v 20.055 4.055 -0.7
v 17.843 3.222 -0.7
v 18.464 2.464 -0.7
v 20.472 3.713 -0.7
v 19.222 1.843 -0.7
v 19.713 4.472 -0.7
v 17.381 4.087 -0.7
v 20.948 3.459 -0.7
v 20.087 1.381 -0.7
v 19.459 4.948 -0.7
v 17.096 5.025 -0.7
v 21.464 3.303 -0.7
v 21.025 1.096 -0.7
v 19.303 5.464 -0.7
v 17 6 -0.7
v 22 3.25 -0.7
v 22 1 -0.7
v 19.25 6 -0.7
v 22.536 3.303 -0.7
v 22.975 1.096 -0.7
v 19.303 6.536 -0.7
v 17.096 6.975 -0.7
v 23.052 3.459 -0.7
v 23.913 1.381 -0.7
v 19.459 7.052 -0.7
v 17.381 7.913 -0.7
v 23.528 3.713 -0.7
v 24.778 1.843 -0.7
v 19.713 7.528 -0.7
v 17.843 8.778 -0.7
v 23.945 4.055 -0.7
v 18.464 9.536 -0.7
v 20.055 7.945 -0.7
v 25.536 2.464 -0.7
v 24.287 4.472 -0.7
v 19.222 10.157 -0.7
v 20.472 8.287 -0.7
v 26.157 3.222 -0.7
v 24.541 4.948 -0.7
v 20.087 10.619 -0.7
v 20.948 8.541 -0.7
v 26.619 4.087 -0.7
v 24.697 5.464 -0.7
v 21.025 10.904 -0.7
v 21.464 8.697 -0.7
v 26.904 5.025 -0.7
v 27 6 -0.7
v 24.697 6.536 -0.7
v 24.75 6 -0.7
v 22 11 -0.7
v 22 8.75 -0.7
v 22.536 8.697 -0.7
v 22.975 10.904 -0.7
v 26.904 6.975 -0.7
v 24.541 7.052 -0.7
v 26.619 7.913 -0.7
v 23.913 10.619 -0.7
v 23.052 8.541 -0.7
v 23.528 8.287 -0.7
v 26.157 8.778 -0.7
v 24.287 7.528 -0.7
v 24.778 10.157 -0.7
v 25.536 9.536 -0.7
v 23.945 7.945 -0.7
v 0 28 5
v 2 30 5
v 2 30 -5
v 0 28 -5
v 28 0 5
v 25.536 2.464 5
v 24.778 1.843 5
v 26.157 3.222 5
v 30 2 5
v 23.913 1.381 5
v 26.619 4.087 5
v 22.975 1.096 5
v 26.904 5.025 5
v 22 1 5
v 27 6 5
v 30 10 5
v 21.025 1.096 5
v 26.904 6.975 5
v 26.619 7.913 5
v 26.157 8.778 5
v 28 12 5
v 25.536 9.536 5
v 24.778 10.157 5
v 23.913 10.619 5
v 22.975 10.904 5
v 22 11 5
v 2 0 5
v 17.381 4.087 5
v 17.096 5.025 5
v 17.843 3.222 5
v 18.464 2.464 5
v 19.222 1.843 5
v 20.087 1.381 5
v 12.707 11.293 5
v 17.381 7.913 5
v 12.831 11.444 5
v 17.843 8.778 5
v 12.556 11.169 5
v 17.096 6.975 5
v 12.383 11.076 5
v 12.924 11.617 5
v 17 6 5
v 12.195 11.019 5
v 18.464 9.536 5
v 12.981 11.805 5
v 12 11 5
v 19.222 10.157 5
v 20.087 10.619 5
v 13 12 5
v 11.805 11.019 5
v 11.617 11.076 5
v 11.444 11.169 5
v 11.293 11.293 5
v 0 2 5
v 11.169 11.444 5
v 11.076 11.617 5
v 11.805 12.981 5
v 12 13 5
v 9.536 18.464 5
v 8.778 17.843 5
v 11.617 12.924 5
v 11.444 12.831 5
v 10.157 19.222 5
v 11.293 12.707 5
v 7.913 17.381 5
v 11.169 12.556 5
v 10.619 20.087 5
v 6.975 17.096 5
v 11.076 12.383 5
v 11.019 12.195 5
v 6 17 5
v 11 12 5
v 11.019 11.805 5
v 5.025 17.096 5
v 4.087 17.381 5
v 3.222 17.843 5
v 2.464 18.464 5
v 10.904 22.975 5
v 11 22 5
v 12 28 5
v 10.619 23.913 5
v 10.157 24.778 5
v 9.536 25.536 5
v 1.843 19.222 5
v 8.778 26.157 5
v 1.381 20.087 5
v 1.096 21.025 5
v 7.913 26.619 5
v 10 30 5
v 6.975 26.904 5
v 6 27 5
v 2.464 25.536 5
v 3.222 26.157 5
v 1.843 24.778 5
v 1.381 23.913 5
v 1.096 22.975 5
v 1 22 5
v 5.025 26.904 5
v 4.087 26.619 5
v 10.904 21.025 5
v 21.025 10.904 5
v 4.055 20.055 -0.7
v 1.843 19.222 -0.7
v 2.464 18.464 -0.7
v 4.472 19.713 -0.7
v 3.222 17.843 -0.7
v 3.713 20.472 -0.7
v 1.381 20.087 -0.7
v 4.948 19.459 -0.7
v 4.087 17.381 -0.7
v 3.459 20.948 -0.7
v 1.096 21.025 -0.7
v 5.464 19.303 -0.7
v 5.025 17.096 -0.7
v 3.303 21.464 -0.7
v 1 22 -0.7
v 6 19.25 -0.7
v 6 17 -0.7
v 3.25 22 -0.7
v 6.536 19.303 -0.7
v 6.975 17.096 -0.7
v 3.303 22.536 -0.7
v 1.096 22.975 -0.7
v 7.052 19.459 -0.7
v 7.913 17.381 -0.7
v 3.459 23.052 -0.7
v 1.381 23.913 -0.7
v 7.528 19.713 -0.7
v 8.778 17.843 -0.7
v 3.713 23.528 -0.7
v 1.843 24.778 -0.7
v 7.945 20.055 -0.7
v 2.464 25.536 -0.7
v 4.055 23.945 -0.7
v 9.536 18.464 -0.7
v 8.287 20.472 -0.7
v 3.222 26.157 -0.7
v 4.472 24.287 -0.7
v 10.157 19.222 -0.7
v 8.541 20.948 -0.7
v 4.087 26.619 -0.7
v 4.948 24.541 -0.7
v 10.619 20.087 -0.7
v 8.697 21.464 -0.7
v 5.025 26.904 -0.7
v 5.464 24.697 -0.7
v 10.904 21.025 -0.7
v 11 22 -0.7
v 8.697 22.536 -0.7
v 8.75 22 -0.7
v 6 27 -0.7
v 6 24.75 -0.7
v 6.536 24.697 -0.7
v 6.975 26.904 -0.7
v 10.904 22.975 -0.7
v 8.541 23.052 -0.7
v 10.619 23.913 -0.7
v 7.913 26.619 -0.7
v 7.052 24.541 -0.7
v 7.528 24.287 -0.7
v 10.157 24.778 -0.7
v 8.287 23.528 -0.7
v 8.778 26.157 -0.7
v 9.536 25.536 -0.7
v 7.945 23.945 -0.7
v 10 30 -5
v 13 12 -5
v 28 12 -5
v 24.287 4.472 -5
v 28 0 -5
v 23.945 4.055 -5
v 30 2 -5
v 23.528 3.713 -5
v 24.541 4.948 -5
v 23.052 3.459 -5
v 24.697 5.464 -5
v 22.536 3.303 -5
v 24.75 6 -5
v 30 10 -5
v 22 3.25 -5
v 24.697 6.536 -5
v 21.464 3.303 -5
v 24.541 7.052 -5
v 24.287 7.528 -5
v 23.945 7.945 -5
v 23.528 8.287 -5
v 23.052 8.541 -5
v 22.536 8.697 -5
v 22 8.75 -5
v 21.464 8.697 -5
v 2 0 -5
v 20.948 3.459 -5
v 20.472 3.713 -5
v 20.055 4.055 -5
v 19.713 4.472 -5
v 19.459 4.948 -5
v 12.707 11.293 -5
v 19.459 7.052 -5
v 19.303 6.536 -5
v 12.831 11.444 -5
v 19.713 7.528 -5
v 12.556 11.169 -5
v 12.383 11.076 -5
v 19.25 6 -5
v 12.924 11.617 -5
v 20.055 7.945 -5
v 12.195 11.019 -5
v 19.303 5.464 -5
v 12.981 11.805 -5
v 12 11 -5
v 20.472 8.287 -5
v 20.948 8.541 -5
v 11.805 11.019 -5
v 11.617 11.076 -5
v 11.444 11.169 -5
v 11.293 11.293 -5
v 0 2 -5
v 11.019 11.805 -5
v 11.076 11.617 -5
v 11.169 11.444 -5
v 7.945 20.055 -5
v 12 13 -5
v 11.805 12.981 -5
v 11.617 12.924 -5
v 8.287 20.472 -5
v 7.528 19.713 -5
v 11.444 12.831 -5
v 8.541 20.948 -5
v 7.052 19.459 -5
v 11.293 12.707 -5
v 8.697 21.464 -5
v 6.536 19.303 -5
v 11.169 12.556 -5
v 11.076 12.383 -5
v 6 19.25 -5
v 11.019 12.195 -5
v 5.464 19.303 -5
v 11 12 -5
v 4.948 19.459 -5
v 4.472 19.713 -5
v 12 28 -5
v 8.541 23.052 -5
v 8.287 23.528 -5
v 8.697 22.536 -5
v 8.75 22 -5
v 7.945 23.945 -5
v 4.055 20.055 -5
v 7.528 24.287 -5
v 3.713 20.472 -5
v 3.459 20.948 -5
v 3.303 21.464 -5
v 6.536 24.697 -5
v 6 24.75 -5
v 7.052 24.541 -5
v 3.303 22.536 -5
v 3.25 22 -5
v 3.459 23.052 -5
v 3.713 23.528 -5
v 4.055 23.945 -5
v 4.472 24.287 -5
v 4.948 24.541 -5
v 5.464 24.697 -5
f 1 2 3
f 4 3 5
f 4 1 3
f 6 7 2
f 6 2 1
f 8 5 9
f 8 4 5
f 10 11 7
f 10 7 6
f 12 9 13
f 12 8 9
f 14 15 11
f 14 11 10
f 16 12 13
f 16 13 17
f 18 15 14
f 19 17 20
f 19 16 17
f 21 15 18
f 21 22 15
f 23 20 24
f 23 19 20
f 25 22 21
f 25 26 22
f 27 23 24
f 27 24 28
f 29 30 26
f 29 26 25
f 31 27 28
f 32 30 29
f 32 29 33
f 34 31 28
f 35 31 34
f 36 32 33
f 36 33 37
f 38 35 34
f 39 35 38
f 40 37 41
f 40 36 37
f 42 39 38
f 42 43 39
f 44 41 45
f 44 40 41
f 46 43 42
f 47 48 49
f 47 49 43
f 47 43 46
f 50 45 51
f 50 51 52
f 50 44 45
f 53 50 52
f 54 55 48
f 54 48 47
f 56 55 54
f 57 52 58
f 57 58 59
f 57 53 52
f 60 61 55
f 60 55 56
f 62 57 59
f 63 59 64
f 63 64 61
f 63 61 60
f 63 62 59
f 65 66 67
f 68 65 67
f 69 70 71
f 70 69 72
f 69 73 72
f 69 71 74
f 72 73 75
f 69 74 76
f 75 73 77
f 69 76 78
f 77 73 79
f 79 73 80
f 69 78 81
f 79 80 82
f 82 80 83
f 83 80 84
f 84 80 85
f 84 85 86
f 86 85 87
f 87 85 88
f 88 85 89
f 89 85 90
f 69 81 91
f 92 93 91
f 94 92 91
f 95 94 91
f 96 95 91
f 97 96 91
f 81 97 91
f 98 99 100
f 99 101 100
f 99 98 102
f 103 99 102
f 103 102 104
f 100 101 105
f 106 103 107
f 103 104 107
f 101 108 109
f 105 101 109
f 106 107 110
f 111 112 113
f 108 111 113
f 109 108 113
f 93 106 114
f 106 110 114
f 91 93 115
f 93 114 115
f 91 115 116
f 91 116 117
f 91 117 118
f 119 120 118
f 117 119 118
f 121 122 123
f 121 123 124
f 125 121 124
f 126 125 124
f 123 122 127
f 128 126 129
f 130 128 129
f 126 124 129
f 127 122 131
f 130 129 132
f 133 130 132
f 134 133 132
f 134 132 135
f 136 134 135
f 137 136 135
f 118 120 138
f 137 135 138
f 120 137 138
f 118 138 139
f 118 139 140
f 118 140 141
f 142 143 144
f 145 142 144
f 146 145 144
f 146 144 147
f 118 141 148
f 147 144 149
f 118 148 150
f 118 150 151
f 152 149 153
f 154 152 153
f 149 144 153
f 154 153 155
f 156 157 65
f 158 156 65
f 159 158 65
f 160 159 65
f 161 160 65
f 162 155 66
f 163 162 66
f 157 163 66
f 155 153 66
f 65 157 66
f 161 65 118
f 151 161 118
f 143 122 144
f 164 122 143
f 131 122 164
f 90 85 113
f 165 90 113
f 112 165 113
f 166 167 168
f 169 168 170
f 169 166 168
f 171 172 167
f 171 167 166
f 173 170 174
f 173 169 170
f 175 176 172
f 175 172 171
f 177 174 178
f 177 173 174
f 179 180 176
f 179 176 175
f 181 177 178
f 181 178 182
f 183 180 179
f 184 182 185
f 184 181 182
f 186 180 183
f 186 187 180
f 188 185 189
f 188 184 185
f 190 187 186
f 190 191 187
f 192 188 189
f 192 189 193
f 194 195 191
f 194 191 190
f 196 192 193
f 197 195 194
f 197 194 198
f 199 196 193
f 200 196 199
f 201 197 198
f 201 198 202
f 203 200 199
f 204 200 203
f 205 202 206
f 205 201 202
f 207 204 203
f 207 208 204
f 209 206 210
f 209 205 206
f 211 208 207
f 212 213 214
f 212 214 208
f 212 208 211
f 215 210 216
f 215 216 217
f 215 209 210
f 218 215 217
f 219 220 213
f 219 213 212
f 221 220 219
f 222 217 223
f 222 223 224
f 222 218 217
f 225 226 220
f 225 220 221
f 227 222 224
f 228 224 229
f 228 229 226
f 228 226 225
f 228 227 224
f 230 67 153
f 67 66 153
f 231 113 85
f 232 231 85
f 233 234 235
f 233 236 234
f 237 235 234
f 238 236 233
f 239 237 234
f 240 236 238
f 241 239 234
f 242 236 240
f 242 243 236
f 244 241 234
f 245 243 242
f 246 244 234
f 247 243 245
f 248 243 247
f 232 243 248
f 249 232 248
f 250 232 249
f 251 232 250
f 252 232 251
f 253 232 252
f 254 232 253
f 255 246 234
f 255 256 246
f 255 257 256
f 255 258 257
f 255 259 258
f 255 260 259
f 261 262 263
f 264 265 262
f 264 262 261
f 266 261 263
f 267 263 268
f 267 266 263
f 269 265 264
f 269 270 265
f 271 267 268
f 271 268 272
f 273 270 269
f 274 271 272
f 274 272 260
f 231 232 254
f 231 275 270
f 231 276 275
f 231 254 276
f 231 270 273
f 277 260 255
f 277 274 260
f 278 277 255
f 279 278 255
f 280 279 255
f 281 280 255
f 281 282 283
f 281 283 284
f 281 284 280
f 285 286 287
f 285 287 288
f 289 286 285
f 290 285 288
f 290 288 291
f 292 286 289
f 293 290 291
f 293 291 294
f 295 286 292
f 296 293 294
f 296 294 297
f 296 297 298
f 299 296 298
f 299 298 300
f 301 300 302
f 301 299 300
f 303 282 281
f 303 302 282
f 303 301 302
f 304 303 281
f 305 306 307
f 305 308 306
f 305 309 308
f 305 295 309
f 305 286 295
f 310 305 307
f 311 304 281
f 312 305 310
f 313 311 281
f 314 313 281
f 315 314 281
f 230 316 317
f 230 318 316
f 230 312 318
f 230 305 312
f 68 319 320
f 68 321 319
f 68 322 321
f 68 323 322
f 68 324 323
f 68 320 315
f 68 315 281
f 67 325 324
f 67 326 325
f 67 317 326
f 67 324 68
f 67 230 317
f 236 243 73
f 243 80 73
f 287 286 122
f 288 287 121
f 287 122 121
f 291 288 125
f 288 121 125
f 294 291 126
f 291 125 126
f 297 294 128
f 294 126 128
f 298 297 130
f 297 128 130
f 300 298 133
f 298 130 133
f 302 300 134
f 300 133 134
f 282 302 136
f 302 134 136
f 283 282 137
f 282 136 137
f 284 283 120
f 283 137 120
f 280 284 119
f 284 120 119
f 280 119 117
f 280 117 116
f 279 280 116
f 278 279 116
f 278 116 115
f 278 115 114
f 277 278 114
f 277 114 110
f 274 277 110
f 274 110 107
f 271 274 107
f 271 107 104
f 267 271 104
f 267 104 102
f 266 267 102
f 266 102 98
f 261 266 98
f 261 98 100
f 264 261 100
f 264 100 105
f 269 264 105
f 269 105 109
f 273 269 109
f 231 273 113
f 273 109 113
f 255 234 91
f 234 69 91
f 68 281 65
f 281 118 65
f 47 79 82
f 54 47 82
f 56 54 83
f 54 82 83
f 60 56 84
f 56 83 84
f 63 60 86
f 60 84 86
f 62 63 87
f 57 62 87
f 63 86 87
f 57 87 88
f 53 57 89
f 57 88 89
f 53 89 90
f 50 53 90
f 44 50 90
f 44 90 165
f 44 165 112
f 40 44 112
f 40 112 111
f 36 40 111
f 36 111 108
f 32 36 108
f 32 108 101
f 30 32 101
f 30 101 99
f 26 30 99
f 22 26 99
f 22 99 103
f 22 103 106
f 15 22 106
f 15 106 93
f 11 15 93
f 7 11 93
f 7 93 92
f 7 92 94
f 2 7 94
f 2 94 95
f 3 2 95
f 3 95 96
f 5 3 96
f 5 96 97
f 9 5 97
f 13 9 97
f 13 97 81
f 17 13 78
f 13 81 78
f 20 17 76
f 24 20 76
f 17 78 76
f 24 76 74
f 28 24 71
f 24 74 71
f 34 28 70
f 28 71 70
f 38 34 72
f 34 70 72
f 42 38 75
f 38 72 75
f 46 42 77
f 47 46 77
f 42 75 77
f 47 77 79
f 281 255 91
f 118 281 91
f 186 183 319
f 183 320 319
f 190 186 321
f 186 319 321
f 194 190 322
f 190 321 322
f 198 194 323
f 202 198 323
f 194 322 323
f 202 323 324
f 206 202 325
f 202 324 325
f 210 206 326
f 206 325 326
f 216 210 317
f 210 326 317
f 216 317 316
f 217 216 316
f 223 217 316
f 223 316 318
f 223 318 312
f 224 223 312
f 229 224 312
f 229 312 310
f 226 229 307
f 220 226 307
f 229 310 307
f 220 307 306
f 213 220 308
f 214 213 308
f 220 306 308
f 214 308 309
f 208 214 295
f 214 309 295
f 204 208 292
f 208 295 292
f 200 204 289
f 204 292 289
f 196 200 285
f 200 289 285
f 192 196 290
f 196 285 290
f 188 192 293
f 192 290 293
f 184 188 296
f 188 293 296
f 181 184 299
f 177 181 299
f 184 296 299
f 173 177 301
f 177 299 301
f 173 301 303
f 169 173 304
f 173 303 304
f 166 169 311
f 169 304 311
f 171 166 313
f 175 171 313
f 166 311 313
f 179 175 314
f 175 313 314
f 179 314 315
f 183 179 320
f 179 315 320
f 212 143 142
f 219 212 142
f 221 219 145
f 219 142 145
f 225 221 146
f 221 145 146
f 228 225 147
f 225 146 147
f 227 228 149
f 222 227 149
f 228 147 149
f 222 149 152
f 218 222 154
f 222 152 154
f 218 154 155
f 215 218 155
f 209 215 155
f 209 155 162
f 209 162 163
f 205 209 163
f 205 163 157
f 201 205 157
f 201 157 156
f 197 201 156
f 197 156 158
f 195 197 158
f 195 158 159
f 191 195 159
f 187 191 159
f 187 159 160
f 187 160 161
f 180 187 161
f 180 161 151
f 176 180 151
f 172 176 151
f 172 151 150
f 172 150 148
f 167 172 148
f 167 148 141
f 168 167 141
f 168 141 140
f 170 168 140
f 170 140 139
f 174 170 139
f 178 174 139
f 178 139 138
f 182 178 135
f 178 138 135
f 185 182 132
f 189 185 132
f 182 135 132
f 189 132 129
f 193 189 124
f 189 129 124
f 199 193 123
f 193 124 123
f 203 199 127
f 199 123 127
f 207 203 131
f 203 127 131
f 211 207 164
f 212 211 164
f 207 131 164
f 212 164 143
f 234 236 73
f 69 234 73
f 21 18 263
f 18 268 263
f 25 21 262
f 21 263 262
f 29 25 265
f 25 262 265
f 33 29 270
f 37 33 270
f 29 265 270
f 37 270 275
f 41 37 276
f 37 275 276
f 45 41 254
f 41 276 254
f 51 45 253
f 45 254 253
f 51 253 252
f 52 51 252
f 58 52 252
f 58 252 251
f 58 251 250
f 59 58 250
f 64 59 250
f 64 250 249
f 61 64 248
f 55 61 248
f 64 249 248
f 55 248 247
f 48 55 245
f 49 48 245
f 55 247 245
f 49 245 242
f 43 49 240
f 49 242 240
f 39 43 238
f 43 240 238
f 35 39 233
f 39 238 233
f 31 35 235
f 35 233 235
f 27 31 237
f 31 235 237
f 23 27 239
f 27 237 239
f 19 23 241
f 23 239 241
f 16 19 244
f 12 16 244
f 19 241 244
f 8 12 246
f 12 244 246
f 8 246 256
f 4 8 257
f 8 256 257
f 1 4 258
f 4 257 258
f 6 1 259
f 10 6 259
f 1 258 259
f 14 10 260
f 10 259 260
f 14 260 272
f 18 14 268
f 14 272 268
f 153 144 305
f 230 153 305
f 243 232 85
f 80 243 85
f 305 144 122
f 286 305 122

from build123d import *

# Parameters (mm, degrees)
EXTRUDE_1_DEPTH           = 5
HOLE_WIZARD_1_D           = 5.5
HOLE_WIZARD_1_CBORE_D     = 10
HOLE_WIZARD_1_CBORE_DEPTH = 5.7
CHAMFER_1_SIZE            = 2
SKETCH_5_R                = 1
CUT_EXTRUDE_1_DEPTH       = 44.588989435


with BuildPart() as part:
    # 草图1 → 凸台-拉伸1 (new, symmetric)
    with BuildSketch(Plane.XY):
        Polygon((0, 0), (0, 30), (12, 30), (12, 12), (30, 12), (30, 0), align=None)
    extrude(amount=EXTRUDE_1_DEPTH, both=True)

    # 打孔尺寸(%根据)内六角圆柱头螺钉的类型1 (through all)
    with Locations(Plane.XY.offset(5)):
        with Locations((6, 22), (22, 6)):
            CounterBoreHole(HOLE_WIZARD_1_D / 2, HOLE_WIZARD_1_CBORE_D / 2, HOLE_WIZARD_1_CBORE_DEPTH)

    # 倒角1
    chamfer_1_edges = [part.edges().sort_by_distance(p)[0] for p in [
        (0, 0, 0),
        (0, 30, 0),
        (12, 30, 0),
        (30, 12, 0),
        (30, 0, 0),
    ]]
    chamfer(chamfer_1_edges, length=CHAMFER_1_SIZE)

    # 草图5 → 切除-拉伸1 (cut, through all)
    with BuildSketch(Plane.XY.offset(5)):
        with Locations((12, 12)):
            Circle(SKETCH_5_R)
    extrude(amount=-CUT_EXTRUDE_1_DEPTH, mode=Mode.SUBTRACT)


solid = part.part
